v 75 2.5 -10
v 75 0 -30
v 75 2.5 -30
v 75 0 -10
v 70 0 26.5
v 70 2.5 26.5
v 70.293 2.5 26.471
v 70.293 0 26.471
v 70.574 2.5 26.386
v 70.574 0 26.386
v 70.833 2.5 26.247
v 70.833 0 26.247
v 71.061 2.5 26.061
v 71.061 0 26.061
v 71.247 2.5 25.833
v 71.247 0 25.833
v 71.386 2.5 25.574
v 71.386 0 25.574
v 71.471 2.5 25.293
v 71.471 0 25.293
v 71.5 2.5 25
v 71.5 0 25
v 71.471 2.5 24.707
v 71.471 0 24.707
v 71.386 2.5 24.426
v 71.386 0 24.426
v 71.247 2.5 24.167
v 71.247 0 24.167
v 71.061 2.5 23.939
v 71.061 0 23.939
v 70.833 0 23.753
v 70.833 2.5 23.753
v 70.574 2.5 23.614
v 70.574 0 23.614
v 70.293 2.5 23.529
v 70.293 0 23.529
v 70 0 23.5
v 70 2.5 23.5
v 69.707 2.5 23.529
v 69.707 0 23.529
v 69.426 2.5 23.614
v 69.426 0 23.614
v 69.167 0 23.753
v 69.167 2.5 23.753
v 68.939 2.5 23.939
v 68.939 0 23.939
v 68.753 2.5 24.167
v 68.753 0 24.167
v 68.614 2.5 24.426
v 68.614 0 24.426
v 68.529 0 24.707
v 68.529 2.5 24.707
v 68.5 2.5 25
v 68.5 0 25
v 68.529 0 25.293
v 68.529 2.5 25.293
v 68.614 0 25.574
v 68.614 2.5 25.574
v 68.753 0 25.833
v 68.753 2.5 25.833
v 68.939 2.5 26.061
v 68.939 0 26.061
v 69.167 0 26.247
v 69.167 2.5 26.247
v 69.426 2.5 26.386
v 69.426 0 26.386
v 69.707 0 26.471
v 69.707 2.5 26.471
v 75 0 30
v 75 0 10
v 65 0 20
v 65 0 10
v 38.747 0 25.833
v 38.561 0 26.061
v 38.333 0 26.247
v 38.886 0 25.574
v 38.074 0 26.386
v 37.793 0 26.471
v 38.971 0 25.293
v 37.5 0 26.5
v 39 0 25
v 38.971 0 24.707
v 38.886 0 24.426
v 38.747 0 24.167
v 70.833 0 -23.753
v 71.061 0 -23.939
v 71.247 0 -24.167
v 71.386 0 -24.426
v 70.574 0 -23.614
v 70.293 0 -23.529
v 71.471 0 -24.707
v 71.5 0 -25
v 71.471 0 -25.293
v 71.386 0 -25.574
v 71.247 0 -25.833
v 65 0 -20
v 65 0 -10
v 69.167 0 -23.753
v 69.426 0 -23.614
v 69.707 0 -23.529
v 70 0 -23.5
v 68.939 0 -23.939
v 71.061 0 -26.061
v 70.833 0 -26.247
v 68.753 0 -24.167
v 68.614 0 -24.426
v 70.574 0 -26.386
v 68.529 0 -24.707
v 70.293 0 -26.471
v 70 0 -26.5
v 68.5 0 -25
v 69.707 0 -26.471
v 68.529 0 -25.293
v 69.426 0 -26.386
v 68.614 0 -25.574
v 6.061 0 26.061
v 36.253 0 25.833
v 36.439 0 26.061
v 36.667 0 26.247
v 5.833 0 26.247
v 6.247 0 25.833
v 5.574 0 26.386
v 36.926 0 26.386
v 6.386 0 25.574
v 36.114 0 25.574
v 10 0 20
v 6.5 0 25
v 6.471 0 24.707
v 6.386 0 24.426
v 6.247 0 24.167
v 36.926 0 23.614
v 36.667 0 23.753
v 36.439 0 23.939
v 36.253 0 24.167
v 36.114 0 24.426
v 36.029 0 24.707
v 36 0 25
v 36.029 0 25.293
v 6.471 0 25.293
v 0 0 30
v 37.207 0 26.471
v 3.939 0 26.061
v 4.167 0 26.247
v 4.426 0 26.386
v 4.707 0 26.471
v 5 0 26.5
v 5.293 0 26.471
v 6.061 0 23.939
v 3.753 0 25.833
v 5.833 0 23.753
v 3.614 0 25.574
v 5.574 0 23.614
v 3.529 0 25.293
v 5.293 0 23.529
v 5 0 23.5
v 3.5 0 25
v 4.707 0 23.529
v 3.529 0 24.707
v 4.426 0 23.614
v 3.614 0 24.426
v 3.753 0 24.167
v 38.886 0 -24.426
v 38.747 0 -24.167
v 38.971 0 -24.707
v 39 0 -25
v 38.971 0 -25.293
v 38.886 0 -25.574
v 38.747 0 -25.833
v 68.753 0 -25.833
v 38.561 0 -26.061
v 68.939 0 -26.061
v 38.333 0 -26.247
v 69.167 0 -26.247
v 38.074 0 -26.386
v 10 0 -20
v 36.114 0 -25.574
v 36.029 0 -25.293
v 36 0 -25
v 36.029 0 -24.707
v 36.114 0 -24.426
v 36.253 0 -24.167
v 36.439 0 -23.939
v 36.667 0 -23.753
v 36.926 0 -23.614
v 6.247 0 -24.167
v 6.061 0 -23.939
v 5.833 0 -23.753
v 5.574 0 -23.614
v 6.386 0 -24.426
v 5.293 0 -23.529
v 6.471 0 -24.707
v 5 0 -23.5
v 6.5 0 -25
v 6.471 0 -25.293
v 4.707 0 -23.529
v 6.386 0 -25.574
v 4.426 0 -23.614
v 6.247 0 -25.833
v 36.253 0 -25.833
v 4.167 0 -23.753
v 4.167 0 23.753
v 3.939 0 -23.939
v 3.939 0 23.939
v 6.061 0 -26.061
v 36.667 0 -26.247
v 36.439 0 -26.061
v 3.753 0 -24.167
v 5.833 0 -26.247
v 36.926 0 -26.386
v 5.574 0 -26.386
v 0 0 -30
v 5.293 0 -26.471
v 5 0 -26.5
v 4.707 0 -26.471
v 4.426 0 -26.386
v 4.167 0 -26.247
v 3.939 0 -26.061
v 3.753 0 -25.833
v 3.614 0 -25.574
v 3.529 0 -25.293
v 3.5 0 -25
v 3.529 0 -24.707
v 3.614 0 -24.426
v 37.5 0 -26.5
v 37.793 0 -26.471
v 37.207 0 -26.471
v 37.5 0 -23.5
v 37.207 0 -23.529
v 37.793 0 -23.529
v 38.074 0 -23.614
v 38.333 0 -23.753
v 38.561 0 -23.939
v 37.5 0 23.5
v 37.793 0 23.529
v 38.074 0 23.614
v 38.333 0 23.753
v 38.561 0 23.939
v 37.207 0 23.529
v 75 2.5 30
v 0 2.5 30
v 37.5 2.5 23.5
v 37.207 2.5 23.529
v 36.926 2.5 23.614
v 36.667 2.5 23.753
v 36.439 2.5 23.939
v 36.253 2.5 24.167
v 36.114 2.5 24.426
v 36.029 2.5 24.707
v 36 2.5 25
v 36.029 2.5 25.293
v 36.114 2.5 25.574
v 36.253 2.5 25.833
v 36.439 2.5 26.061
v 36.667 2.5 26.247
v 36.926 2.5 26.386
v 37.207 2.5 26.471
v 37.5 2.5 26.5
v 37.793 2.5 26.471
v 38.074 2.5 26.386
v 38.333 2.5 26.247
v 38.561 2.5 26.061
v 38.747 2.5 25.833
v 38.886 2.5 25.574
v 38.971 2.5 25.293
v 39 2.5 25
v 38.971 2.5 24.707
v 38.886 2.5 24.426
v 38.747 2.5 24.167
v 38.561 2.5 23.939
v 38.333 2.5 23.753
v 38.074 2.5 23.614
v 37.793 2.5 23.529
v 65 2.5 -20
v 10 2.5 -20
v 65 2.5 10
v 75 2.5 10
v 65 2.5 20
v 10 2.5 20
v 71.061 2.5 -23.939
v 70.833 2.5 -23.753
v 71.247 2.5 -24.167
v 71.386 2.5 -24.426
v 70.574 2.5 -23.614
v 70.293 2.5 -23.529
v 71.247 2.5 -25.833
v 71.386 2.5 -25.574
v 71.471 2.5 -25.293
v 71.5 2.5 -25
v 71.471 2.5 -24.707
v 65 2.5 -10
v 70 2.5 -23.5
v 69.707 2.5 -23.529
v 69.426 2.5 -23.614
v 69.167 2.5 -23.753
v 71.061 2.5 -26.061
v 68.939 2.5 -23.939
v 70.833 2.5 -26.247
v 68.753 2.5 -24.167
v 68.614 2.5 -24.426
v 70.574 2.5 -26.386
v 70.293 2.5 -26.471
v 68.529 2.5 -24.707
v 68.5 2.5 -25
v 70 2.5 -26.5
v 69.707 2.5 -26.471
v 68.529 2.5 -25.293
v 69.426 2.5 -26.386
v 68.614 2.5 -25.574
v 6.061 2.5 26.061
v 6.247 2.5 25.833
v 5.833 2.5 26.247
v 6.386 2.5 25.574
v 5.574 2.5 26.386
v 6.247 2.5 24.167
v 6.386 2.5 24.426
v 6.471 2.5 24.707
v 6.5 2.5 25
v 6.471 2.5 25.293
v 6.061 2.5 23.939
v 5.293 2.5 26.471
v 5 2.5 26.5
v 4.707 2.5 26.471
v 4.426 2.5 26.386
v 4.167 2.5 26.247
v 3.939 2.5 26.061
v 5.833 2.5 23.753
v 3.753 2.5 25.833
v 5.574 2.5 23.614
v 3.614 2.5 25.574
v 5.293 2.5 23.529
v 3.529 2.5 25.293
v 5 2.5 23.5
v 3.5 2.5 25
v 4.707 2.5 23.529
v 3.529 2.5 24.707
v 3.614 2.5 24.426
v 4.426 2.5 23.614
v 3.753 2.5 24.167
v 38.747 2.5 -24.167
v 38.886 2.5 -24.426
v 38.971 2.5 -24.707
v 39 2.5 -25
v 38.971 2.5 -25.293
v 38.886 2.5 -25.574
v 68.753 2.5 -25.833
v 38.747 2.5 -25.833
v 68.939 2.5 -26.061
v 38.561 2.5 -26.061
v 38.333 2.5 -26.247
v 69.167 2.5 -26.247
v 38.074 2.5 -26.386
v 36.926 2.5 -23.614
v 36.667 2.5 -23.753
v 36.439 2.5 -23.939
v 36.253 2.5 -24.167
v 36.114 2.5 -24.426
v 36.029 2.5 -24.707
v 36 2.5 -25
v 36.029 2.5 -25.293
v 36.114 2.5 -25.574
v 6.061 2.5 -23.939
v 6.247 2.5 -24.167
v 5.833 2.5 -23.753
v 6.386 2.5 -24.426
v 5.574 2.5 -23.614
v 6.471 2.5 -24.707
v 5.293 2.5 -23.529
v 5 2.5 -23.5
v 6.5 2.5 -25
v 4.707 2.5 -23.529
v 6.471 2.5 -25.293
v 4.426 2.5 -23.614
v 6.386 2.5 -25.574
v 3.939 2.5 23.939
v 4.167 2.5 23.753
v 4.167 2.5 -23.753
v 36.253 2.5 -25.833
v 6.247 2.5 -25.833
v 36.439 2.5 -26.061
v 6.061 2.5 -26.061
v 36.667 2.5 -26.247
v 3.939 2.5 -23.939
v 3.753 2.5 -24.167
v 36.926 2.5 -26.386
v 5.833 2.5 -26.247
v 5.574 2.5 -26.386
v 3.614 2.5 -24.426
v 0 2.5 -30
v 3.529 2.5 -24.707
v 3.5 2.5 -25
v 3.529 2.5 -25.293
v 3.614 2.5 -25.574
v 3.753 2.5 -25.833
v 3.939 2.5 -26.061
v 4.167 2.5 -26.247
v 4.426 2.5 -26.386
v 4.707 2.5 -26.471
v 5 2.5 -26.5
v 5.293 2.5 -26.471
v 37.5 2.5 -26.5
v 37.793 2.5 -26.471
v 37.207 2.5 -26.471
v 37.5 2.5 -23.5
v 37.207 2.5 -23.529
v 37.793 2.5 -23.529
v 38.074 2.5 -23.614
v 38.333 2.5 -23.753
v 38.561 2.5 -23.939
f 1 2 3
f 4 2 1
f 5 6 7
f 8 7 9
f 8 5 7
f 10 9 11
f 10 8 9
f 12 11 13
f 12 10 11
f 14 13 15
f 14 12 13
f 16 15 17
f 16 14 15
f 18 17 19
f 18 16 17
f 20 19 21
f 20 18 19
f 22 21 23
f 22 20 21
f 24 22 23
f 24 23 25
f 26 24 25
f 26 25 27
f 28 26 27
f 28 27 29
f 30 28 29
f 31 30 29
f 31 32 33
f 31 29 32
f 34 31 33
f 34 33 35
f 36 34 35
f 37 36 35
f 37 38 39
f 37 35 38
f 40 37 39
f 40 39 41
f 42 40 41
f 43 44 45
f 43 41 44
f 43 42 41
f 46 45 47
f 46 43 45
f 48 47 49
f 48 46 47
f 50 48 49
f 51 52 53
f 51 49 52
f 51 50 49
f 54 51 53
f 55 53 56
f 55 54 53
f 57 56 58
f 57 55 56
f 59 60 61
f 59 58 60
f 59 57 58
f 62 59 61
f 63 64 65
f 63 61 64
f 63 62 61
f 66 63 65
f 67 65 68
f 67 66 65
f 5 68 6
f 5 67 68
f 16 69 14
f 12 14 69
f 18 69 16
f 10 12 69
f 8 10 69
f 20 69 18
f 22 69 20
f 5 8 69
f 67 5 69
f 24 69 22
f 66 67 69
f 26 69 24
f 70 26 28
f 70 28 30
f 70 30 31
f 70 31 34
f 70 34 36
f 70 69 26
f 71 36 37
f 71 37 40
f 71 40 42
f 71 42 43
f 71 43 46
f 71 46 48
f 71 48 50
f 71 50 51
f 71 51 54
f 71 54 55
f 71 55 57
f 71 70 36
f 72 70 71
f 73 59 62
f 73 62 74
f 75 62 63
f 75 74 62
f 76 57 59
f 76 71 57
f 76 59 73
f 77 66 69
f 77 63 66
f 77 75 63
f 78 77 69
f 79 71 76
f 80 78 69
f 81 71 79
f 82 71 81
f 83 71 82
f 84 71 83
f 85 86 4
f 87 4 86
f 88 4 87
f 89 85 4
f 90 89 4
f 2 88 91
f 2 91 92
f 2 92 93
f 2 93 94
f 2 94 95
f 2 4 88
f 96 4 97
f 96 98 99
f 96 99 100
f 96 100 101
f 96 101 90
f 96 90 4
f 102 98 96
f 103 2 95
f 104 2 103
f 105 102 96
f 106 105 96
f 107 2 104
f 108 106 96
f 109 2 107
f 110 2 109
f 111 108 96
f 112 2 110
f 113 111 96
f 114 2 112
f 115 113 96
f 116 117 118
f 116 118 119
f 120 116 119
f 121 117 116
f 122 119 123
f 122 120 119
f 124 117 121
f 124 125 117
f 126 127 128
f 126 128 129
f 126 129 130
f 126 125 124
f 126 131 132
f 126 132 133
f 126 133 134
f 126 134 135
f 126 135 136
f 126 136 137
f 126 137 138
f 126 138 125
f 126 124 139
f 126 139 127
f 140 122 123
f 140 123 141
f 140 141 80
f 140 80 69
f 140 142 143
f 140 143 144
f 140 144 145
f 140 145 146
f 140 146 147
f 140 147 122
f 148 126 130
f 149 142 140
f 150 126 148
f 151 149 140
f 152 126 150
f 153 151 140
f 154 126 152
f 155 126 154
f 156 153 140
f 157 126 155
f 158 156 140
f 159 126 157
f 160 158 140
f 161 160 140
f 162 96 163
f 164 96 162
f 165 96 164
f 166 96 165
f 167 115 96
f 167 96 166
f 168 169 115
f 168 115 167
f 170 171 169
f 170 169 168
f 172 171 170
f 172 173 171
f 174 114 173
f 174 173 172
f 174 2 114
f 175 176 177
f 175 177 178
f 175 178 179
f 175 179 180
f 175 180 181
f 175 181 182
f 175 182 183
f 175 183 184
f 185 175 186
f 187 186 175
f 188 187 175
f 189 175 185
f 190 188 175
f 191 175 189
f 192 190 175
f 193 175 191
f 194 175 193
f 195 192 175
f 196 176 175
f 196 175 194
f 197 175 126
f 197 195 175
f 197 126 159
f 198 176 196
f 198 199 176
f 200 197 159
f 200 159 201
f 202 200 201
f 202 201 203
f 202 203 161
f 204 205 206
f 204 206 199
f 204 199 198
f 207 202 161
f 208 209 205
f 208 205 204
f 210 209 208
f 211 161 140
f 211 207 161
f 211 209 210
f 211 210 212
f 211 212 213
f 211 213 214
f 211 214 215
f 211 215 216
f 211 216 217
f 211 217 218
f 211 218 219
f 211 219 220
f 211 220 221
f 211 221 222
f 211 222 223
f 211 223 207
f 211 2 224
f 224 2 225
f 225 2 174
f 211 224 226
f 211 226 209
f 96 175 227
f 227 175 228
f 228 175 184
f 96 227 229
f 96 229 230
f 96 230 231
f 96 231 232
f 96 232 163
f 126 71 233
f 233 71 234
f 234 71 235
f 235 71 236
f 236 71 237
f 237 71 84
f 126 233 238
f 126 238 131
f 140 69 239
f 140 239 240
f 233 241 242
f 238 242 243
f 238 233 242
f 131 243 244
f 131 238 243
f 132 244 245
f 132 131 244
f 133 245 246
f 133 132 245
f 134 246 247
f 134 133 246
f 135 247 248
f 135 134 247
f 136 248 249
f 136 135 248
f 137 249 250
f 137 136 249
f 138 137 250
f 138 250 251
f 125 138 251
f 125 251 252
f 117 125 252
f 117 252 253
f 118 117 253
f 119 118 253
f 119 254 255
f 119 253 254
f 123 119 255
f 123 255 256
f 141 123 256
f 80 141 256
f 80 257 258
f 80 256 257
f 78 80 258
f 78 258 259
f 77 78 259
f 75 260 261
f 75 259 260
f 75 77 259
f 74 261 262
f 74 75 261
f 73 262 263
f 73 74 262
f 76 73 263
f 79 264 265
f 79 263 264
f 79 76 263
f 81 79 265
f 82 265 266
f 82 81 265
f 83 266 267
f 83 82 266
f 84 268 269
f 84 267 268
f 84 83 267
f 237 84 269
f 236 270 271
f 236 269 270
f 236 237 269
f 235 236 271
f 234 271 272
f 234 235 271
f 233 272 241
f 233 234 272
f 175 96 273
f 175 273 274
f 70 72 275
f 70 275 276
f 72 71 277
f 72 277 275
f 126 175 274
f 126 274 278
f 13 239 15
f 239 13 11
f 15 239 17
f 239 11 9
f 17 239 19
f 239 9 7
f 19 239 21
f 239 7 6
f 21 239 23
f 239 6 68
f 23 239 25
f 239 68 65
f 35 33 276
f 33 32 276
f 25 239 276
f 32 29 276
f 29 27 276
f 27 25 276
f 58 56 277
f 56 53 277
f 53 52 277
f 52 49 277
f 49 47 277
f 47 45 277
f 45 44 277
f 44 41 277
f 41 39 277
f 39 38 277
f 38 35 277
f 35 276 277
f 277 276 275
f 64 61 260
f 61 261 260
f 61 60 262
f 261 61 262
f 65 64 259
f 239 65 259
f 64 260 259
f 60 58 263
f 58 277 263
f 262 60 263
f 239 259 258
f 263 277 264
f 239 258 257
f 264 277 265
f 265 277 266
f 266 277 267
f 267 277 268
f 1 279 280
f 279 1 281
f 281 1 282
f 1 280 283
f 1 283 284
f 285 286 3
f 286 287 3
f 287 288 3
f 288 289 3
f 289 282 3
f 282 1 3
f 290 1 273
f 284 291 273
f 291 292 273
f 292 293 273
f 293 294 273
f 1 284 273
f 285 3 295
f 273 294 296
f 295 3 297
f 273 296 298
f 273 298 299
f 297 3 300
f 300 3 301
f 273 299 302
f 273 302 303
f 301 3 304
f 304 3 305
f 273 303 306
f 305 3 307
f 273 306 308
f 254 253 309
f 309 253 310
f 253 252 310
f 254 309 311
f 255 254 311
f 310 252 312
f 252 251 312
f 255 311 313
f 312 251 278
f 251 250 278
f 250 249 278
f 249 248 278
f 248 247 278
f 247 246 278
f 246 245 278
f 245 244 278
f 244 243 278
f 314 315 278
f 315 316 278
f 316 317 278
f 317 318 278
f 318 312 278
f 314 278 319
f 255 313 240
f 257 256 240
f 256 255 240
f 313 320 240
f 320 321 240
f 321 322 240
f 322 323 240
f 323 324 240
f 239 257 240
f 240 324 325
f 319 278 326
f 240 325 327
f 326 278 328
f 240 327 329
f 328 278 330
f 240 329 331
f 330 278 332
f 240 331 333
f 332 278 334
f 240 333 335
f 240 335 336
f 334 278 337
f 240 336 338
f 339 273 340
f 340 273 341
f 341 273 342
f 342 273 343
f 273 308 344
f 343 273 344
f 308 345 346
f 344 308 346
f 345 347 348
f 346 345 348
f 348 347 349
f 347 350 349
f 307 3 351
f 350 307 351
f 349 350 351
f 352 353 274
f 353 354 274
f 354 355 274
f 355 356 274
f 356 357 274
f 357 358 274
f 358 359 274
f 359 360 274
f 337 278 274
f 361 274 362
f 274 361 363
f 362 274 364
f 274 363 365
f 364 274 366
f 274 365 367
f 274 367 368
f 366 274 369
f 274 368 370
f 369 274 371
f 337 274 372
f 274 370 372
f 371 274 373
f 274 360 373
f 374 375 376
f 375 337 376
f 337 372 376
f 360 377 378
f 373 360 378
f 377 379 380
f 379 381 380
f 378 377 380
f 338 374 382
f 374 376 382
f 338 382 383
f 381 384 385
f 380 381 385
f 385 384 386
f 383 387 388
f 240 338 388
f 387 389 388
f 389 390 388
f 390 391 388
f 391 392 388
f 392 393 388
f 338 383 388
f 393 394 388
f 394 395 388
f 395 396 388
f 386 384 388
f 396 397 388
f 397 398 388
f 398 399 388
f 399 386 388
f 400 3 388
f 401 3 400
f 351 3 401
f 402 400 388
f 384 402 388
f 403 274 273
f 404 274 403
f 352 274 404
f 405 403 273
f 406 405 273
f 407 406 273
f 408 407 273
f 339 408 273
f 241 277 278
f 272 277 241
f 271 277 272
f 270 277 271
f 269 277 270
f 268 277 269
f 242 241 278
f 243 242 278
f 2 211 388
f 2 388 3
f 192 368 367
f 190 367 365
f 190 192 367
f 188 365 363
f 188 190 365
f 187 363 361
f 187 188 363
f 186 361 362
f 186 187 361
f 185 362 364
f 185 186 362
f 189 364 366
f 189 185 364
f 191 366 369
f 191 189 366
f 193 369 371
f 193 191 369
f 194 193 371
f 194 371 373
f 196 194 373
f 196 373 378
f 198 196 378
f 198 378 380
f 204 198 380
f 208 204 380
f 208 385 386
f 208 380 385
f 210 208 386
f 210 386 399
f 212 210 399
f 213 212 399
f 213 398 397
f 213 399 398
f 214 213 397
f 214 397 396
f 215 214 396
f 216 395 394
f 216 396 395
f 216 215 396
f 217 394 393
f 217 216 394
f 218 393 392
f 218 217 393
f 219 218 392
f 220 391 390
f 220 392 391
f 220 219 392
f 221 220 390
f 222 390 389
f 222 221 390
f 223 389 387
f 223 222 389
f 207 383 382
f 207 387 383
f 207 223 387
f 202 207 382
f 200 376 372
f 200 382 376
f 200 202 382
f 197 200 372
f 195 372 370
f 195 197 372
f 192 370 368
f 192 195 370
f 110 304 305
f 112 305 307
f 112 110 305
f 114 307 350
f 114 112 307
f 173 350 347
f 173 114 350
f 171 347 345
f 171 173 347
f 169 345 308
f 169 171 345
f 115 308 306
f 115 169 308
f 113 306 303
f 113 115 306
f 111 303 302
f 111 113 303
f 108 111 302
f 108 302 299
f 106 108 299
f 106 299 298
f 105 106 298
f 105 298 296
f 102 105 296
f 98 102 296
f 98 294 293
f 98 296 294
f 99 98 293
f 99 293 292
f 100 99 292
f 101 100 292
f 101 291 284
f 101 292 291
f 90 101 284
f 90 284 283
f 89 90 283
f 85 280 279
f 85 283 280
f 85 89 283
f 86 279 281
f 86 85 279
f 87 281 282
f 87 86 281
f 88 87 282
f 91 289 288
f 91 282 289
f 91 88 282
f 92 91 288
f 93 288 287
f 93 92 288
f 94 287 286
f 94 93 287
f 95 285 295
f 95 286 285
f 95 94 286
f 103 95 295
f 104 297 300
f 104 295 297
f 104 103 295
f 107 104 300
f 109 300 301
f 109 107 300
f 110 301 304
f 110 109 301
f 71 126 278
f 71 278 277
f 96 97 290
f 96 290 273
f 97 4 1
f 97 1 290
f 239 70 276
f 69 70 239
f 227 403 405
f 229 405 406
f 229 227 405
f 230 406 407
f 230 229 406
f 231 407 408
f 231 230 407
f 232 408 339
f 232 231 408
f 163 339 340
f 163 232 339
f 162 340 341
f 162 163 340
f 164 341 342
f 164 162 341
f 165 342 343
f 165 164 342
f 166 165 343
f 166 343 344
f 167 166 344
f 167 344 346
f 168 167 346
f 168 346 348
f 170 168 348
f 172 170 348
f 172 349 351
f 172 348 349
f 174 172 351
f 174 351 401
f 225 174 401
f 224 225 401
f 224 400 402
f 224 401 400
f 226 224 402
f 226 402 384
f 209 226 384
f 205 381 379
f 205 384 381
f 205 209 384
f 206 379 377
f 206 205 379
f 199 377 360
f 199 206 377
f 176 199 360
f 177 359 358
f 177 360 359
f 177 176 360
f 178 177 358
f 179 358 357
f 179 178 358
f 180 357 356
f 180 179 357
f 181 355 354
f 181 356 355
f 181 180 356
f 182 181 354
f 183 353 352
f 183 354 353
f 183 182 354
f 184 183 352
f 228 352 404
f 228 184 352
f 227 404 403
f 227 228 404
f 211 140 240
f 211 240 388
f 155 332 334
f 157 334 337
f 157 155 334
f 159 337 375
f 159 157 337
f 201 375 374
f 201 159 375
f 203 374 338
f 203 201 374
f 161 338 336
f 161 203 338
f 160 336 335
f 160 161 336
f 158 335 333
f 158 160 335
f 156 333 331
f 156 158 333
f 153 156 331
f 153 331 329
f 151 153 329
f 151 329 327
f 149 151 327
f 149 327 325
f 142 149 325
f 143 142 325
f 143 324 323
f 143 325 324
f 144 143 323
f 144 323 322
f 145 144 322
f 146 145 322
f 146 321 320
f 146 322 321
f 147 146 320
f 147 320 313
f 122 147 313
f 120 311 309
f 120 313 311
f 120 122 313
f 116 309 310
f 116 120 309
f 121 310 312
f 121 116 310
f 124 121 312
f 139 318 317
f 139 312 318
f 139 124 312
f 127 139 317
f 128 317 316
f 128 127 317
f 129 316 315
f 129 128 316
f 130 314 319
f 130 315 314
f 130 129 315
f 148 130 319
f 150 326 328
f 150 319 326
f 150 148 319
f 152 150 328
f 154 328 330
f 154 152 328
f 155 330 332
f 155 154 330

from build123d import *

# Parameters (mm, degrees)
EXTRUDE_2_DEPTH     = 2.5
SKETCH_2_R          = 1.5
CUT_EXTRUDE_1_DEPTH = 81.816149376


with BuildPart() as part:
    # 草图1 → 凸台-拉伸2 (new body)
    with BuildSketch(Plane(origin=(0, 0, 0), x_dir=(1, 0, 0), z_dir=(0, 1, 0))):
        Polygon((0, -30), (0, 30), (75, 30), (75, 10), (65, 10), (65, 20), (10, 20), (10, -20), (65, -20), (65, -10), (75, -10), (75, -30), align=None)
    extrude(amount=EXTRUDE_2_DEPTH)

    # 草图2 → 切除-拉伸1 (cut, through all)
    with BuildSketch(Plane(origin=(0, 0, 0), x_dir=(1, 0, 0), z_dir=(0, 1, 0))):
        with Locations(Location((5, 25, 0), (0, 0, 270))):
            Circle(SKETCH_2_R)
        with Locations(Location((70, 25, 0), (0, 0, 90))):
            Circle(SKETCH_2_R)
        with Locations(Location((70, -25, 0), (0, 0, 270))):
            Circle(SKETCH_2_R)
        with Locations(Location((5, -25, 0), (0, 0, 90))):
            Circle(SKETCH_2_R)
        with Locations(Location((37.5, -25, 0), (0, 0, 90))):
            Circle(SKETCH_2_R)
        with Locations(Location((37.5, 25, 0), (0, 0, 270))):
            Circle(SKETCH_2_R)
    extrude(amount=CUT_EXTRUDE_1_DEPTH, mode=Mode.SUBTRACT)


solid = part.part
